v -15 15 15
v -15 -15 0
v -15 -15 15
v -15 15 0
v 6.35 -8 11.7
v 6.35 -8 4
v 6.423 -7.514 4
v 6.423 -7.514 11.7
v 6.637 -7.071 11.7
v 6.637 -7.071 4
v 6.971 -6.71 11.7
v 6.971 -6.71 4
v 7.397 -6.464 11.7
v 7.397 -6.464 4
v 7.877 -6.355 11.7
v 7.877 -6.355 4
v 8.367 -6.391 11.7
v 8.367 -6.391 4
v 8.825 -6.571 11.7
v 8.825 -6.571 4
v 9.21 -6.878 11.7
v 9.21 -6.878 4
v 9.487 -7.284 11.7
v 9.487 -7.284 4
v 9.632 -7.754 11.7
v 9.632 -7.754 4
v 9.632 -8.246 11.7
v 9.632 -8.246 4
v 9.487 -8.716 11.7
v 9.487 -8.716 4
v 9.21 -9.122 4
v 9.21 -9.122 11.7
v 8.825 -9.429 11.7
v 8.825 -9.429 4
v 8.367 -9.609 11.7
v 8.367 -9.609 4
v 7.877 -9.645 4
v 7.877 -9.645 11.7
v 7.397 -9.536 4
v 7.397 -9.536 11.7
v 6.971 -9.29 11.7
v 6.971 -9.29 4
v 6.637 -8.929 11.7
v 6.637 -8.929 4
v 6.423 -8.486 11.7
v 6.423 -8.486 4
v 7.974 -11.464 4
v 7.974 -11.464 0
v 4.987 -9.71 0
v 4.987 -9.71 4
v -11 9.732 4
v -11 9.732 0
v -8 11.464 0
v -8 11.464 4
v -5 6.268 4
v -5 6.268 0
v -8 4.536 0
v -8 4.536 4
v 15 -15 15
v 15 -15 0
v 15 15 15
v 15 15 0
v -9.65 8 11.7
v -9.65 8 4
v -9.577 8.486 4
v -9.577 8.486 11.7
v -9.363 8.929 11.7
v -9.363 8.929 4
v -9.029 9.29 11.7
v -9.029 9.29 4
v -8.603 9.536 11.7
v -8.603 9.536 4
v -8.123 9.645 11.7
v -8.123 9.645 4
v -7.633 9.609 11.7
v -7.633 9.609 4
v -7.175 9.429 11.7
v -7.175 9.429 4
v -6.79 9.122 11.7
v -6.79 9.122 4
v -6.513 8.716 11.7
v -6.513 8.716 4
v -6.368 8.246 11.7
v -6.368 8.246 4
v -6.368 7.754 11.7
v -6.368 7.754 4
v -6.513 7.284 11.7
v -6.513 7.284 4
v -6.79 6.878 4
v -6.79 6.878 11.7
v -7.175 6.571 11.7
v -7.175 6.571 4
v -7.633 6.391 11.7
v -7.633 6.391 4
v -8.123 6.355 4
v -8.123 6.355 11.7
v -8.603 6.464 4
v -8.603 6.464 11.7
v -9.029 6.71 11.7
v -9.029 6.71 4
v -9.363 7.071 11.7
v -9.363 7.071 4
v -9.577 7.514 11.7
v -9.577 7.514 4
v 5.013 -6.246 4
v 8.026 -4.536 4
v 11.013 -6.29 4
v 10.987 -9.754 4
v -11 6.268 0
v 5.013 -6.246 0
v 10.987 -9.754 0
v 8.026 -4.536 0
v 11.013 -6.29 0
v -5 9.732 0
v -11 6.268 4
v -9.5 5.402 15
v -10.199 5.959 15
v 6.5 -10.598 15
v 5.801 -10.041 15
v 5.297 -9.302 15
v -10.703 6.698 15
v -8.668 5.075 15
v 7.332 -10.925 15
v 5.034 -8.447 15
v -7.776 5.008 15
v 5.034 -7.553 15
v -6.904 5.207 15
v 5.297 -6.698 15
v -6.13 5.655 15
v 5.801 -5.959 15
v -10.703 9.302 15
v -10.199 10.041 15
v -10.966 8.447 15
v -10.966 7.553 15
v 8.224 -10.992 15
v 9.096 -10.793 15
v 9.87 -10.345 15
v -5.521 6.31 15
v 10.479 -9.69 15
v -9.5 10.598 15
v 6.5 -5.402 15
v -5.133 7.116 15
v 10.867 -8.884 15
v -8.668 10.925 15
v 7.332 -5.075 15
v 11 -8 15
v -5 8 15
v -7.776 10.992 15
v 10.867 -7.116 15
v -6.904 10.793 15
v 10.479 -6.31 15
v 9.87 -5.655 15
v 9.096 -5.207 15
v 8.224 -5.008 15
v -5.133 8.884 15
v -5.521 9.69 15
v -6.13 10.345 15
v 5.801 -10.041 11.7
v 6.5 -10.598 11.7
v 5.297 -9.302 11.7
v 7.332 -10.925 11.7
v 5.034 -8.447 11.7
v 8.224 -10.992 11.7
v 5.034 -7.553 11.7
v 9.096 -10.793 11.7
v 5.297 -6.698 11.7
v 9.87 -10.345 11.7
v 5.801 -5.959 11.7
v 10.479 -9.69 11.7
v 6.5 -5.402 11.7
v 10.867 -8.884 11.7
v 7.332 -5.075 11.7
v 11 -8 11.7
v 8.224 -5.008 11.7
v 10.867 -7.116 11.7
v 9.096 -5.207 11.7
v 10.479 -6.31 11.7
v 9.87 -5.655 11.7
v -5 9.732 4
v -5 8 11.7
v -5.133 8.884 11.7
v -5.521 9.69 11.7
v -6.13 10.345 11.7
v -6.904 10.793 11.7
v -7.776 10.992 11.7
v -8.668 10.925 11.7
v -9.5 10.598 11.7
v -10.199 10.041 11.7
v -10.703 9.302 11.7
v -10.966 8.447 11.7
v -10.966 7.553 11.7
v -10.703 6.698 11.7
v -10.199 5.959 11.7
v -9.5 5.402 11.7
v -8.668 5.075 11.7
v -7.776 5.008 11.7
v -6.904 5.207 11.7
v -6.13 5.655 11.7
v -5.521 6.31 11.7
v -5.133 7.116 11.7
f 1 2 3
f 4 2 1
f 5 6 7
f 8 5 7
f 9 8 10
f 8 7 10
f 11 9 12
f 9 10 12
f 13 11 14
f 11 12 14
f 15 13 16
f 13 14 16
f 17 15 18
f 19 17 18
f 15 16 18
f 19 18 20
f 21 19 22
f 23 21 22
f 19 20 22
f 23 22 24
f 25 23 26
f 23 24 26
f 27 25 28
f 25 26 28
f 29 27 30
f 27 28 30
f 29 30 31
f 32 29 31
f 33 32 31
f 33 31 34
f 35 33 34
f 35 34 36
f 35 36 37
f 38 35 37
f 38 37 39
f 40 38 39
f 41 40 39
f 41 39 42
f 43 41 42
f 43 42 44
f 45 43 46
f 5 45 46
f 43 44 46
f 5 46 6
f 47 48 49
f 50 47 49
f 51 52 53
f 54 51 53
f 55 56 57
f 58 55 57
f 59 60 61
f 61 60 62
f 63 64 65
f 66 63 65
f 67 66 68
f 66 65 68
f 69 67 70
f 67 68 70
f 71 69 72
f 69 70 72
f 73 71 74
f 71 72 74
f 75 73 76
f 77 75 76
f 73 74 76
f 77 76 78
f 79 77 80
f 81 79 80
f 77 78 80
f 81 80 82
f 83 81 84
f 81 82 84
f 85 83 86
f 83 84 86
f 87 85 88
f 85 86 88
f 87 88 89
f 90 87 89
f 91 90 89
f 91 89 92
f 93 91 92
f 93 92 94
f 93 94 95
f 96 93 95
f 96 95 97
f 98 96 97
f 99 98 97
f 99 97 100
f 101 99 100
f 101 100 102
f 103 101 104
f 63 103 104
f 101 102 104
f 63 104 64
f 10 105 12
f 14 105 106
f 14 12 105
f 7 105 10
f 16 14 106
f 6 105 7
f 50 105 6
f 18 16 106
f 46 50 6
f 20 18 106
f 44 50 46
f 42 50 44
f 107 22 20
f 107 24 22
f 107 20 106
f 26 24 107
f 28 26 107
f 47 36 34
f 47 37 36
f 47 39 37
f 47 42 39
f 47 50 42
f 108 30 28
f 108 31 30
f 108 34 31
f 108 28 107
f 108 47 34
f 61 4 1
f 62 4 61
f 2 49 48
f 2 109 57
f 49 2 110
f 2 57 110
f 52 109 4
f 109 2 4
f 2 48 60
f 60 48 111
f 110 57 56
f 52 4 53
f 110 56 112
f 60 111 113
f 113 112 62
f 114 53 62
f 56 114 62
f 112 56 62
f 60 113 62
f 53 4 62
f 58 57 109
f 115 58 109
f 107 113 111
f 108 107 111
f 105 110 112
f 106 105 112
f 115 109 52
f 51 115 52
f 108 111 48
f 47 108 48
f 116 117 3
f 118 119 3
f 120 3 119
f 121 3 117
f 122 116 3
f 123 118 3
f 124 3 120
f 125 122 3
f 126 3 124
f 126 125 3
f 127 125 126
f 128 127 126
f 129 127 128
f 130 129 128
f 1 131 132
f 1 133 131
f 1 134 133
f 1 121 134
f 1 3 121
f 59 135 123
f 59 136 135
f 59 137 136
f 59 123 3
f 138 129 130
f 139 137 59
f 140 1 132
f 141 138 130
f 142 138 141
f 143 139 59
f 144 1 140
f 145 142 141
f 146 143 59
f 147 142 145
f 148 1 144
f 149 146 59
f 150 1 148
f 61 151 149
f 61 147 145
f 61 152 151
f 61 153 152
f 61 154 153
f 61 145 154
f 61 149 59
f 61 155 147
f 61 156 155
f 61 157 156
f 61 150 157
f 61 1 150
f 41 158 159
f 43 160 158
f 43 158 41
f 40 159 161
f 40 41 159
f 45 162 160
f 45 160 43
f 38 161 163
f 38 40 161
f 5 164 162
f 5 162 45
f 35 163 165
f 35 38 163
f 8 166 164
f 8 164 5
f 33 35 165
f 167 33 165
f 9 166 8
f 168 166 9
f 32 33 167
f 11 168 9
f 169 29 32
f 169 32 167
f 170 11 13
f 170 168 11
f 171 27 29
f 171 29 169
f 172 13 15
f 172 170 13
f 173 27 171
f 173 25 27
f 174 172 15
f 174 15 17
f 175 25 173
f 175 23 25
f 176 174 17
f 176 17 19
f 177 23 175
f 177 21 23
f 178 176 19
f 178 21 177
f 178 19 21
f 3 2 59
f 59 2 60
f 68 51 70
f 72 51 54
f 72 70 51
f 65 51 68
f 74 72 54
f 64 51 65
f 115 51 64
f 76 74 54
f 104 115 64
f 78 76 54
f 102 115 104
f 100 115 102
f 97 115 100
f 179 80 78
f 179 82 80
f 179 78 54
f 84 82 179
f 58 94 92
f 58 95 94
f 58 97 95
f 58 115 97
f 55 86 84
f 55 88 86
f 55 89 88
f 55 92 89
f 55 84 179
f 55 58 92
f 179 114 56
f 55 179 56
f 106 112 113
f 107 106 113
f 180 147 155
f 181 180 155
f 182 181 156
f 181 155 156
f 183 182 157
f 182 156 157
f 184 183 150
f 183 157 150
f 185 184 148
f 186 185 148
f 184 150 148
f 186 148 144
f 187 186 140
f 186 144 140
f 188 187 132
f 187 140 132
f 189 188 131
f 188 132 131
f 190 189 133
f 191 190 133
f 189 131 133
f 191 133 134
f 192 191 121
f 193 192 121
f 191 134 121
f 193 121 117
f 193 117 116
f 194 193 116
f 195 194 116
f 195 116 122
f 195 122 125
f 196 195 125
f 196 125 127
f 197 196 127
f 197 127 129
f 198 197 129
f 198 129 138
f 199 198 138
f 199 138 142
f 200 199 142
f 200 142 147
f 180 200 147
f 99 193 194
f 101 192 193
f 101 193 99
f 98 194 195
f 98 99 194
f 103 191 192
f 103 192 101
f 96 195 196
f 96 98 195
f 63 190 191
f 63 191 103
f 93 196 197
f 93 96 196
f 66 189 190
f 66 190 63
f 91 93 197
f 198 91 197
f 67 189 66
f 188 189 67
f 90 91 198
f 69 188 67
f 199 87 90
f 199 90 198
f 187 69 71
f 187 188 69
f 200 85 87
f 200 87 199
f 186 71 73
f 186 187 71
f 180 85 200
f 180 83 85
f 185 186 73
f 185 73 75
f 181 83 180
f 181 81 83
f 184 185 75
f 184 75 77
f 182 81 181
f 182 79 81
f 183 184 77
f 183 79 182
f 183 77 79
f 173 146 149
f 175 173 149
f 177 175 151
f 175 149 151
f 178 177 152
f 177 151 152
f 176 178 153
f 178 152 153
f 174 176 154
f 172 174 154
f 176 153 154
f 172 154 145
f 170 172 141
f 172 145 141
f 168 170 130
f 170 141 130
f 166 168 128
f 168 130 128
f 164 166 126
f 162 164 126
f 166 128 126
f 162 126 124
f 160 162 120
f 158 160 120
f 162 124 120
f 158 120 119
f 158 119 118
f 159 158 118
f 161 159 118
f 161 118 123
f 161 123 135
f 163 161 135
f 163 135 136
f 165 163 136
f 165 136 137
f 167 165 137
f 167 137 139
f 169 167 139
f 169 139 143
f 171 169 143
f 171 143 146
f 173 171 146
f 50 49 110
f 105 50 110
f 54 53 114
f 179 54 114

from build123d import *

# Parameters (mm, degrees)
F0_W           = 30
F0_H           = 30
F1_DEPTH       = 15
F3_D           = 3.3
F3_CBORE_D     = 6
F3_CBORE_DEPTH = 3.3
F5_DEPTH       = 4


with BuildPart() as f1:
    # F0 (on Top) → F1 (new body)
    with BuildSketch(Plane.XY):
        Rectangle(F0_W, F0_H)
    extrude(amount=F1_DEPTH)

    # F3 (through all)
    with Locations(Plane.XY.offset(15)):
        with Locations((-8, 8), (8, -8)):
            CounterBoreHole(F3_D / 2, F3_CBORE_D / 2, F3_CBORE_DEPTH)

    # F4 (on face) → F5 (cut)
    with BuildSketch(Plane(origin=(0, 0, 0), x_dir=(1, 0, 0), z_dir=(0, 0, -1))):
        Polygon((-5, -9.732051), (-5, -6.267949), (-8, -4.535898), (-11, -6.267949), (-11, -9.732051), (-8, -11.464102), align=None)
        Polygon((8.025555, 4.535993), (11.012696, 6.290127), (10.987141, 9.754135), (7.974445, 11.464007), (4.987304, 9.709873), (5.012859, 6.245865), align=None)
    extrude(amount=-F5_DEPTH, mode=Mode.SUBTRACT)


solid = f1.part
